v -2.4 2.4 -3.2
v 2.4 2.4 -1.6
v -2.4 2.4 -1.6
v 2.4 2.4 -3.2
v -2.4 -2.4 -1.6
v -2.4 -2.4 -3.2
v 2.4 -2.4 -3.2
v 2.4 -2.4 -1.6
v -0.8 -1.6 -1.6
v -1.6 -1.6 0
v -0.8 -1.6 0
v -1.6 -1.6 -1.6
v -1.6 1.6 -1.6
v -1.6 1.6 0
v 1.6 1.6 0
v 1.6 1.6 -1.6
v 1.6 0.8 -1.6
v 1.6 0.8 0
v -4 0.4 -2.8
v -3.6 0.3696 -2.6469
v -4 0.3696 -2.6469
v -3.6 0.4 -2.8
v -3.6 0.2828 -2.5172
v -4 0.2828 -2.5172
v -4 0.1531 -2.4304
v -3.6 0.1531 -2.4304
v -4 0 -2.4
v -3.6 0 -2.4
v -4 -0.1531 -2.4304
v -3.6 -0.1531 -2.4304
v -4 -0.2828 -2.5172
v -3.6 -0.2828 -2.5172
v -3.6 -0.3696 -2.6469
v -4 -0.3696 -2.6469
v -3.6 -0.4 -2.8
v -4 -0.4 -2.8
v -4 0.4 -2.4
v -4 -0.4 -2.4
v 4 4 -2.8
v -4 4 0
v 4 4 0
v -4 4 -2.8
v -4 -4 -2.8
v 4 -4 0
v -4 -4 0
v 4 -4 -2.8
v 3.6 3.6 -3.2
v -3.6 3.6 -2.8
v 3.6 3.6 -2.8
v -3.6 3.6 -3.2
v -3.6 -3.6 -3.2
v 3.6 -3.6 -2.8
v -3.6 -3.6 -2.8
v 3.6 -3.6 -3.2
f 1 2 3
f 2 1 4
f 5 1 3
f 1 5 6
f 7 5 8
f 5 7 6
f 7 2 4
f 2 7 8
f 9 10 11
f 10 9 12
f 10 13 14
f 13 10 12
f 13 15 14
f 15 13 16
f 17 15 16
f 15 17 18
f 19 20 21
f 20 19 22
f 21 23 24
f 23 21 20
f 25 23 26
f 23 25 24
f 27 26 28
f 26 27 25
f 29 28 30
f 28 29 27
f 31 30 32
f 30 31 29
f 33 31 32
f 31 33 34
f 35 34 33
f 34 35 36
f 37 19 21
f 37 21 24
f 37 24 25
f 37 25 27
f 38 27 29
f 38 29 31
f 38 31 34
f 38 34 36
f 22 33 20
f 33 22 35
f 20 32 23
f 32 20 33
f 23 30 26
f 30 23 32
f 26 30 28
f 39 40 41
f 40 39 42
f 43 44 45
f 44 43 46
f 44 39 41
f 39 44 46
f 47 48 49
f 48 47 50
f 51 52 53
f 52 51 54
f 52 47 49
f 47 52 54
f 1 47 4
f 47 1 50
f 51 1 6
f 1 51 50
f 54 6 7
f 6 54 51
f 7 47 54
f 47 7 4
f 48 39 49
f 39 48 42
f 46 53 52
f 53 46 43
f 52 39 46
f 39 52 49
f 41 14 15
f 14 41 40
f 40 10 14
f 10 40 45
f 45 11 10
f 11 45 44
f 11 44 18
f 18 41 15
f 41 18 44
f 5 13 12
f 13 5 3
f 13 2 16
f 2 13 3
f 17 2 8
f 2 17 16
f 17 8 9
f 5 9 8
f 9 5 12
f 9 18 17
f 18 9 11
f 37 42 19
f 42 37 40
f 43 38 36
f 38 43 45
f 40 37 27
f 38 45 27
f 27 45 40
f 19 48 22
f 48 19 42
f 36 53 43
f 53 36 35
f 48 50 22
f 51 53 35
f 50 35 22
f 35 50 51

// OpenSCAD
// file: ../../p/2-4edge.scad
use <../lib.scad>
function ldraw_lib__2_4edge() = [
// 0 Circle 0.5
// 0 Name: 2-4edge.dat
// 0 Author: James Jessiman
// 0 !LDRAW_ORG Primitive UPDATE 2017-01
// 0 !LICENSE Licensed under CC BY 2.0 and CC BY 4.0 : see CAreadme.txt
// 
// 0 BFC CERTIFY CCW
  [0,"BFC","CERTIFY"],
  [0,"BFC","CCW"],
// 
// 0 !HISTORY 2007-06-24 [PTadmin] Header formatted for Contributor Agreement
// 0 !HISTORY 2008-07-01 [PTadmin] Official Update 2008-01
// 0 !HISTORY 2017-01-15 [Steffen] BFCed
// 0 !HISTORY 2017-12-30 [PTadmin] Official Update 2017-01
// 
// 
// 2 24 1 0 0 0.9239 0 0.3827
  [2,24,1,0,0,0.9239,0,0.3827],
// 2 24 0.9239 0 0.3827 0.7071 0 0.7071
  [2,24,0.9239,0,0.3827,0.7071,0,0.7071],
// 2 24 0.7071 0 0.7071 0.3827 0 0.9239
  [2,24,0.7071,0,0.7071,0.3827,0,0.9239],
// 2 24 0.3827 0 0.9239 0 0 1
  [2,24,0.3827,0,0.9239,0,0,1],
// 2 24 0 0 1 -0.3827 0 0.9239
  [2,24,0,0,1,-0.3827,0,0.9239],
// 2 24 -0.3827 0 0.9239 -0.7071 0 0.7071
  [2,24,-0.3827,0,0.9239,-0.7071,0,0.7071],
// 2 24 -0.7071 0 0.7071 -0.9239 0 0.3827
  [2,24,-0.7071,0,0.7071,-0.9239,0,0.3827],
// 2 24 -0.9239 0 0.3827 -1 0 0
  [2,24,-0.9239,0,0.3827,-1,0,0],
];
makepoly(ldraw_lib__2_4edge(), line=0.2);
// file: ../../p/2-4cyli.scad
use <../lib.scad>
function ldraw_lib__2_4cyli() = [
// 0 Cylinder 0.5
// 0 Name: 2-4cyli.dat
// 0 Author: James Jessiman
// 0 !LDRAW_ORG Primitive UPDATE 2005-01
// 0 !LICENSE Licensed under CC BY 2.0 and CC BY 4.0 : see CAreadme.txt
// 
// 0 BFC CERTIFY CCW
  [0,"BFC","CERTIFY"],
  [0,"BFC","CCW"],
// 
// 0 !HISTORY 2002-03-23 [sbliss] Added BFC statement; compacted code
// 0 !HISTORY 2002-04-25 [PTadmin] Official Update 2002-02
// 0 !HISTORY 2004-12-11 [nielsk] Recreated using Primitive Generator, Edge lines fixed, BFC changed to CCW
// 0 !HISTORY 2005-12-28 [PTadmin] Official Update 2005-01
// 0 !HISTORY 2007-06-24 [PTadmin] Header formatted for Contributor Agreement
// 0 !HISTORY 2008-07-01 [PTadmin] Official Update 2008-01
// 
// 
// 4 16 .9239 1 .3827 .9239 0 .3827 1 0 0 1 1 0
  [4,16,.9239,1,.3827,.9239,0,.3827,1,0,0,1,1,0],
// 4 16 .7071 1 .7071 .7071 0 .7071 .9239 0 .3827 .9239 1 .3827
  [4,16,.7071,1,.7071,.7071,0,.7071,.9239,0,.3827,.9239,1,.3827],
// 4 16 .3827 1 .9239 .3827 0 .9239 .7071 0 .7071 .7071 1 .7071
  [4,16,.3827,1,.9239,.3827,0,.9239,.7071,0,.7071,.7071,1,.7071],
// 4 16 0 1 1 0 0 1 .3827 0 .9239 .3827 1 .9239
  [4,16,0,1,1,0,0,1,.3827,0,.9239,.3827,1,.9239],
// 4 16 -.3827 1 .9239 -.3827 0 .9239 0 0 1 0 1 1
  [4,16,-.3827,1,.9239,-.3827,0,.9239,0,0,1,0,1,1],
// 4 16 -.7071 1 .7071 -.7071 0 .7071 -.3827 0 .9239 -.3827 1 .9239
  [4,16,-.7071,1,.7071,-.7071,0,.7071,-.3827,0,.9239,-.3827,1,.9239],
// 4 16 -.9239 1 .3827 -.9239 0 .3827 -.7071 0 .7071 -.7071 1 .7071
  [4,16,-.9239,1,.3827,-.9239,0,.3827,-.7071,0,.7071,-.7071,1,.7071],
// 4 16 -1 1 0 -1 0 0 -.9239 0 .3827 -.9239 1 .3827
  [4,16,-1,1,0,-1,0,0,-.9239,0,.3827,-.9239,1,.3827],
// 5 24 1 1 0 1 0 0 1 1 -.4142 .9239 1 .3827
  [5,24,1,1,0,1,0,0,1,1,-.4142,.9239,1,.3827],
// 5 24 .9239 1 .3827 .9239 0 .3827 1 1 0 .7071 1 .7071
  [5,24,.9239,1,.3827,.9239,0,.3827,1,1,0,.7071,1,.7071],
// 5 24 .7071 1 .7071 .7071 0 .7071 .9239 1 .3827 .3827 1 .9239
  [5,24,.7071,1,.7071,.7071,0,.7071,.9239,1,.3827,.3827,1,.9239],
// 5 24 .3827 1 .9239 .3827 0 .9239 .7071 1 .7071 0 1 1
  [5,24,.3827,1,.9239,.3827,0,.9239,.7071,1,.7071,0,1,1],
// 5 24 0 1 1 0 0 1 .3827 1 .9239 -.3827 1 .9239
  [5,24,0,1,1,0,0,1,.3827,1,.9239,-.3827,1,.9239],
// 5 24 -.3827 1 .9239 -.3827 0 .9239 0 1 1 -.7071 1 .7071
  [5,24,-.3827,1,.9239,-.3827,0,.9239,0,1,1,-.7071,1,.7071],
// 5 24 -.7071 1 .7071 -.7071 0 .7071 -.3827 1 .9239 -.9239 1 .3827
  [5,24,-.7071,1,.7071,-.7071,0,.7071,-.3827,1,.9239,-.9239,1,.3827],
// 5 24 -.9239 1 .3827 -.9239 0 .3827 -.7071 1 .7071 -1 1 0
  [5,24,-.9239,1,.3827,-.9239,0,.3827,-.7071,1,.7071,-1,1,0],
// 5 24 -1 1 0 -1 0 0 -.9239 1 .3827 -1 1 -.4142
  [5,24,-1,1,0,-1,0,0,-.9239,1,.3827,-1,1,-.4142],
// 0
];
makepoly(ldraw_lib__2_4cyli(), line=0.2);
// file: ../../p/box4.scad
use <../lib.scad>
function ldraw_lib__box4() = [
// 0 Box with 4 Faces (2 Parallel Pairs) and All Edges
// 0 Name: box4.dat
// 0 Author: James Jessiman
// 0 !LDRAW_ORG Primitive UPDATE 2012-01
// 0 !LICENSE Licensed under CC BY 2.0 and CC BY 4.0 : see CAreadme.txt
// 
// 0 BFC CERTIFY CCW
  [0,"BFC","CERTIFY"],
  [0,"BFC","CCW"],
// 
// 0 !HISTORY 2002-04-03 [sbliss] Modified for BFC compliance
// 0 !HISTORY 2002-04-25 [PTadmin] Official Update 2002-02
// 0 !HISTORY 2007-06-24 [PTadmin] Header formatted for Contributor Agreement
// 0 !HISTORY 2008-07-01 [PTadmin] Official Update 2008-01
// 0 !HISTORY 2012-02-16 [Philo] Changed to CCW
// 0 !HISTORY 2012-03-30 [PTadmin] Official Update 2012-01
// 
// 
// 2 24 1 1 1 -1 1 1
  [2,24,1,1,1,-1,1,1],
// 2 24 -1 1 1 -1 1 -1
  [2,24,-1,1,1,-1,1,-1],
// 2 24 -1 1 -1 1 1 -1
  [2,24,-1,1,-1,1,1,-1],
// 2 24 1 1 -1 1 1 1
  [2,24,1,1,-1,1,1,1],
// 2 24 1 0 1 -1 0 1
  [2,24,1,0,1,-1,0,1],
// 2 24 -1 0 1 -1 0 -1
  [2,24,-1,0,1,-1,0,-1],
// 2 24 -1 0 -1 1 0 -1
  [2,24,-1,0,-1,1,0,-1],
// 2 24 1 0 -1 1 0 1
  [2,24,1,0,-1,1,0,1],
// 2 24 1 0 1 1 1 1
  [2,24,1,0,1,1,1,1],
// 2 24 -1 0 1 -1 1 1
  [2,24,-1,0,1,-1,1,1],
// 2 24 1 0 -1 1 1 -1
  [2,24,1,0,-1,1,1,-1],
// 2 24 -1 0 -1 -1 1 -1
  [2,24,-1,0,-1,-1,1,-1],
// 4 16 -1 1 1 -1 0 1 1 0 1 1 1 1
  [4,16,-1,1,1,-1,0,1,1,0,1,1,1,1],
// 4 16 -1 1 -1 -1 0 -1 -1 0 1 -1 1 1
  [4,16,-1,1,-1,-1,0,-1,-1,0,1,-1,1,1],
// 4 16 1 1 -1 1 0 -1 -1 0 -1 -1 1 -1
  [4,16,1,1,-1,1,0,-1,-1,0,-1,-1,1,-1],
// 4 16 1 1 1 1 0 1 1 0 -1 1 1 -1
  [4,16,1,1,1,1,0,1,1,0,-1,1,1,-1],
];
makepoly(ldraw_lib__box4(), line=0.2);
// file: ../../p/box2-9p.scad
use <../lib.scad>
function ldraw_lib__box2_9p() = [
// 0 Box with 2 Faces with 3 Parallel Edges
// 0 Name: box2-9p.dat
// 0 Author: Ronald Vallenduuk [Duq]
// 0 !LDRAW_ORG Primitive UPDATE 2013-02
// 0 !LICENSE Licensed under CC BY 2.0 and CC BY 4.0 : see CAreadme.txt
// 
// 0 BFC CERTIFY CCW
  [0,"BFC","CERTIFY"],
  [0,"BFC","CCW"],
// 
// 0 !HISTORY 2013-12-23 [PTadmin] Official Update 2013-02
// 
// 
// 2 24 1 1 1 -1 1 1
  [2,24,1,1,1,-1,1,1],
// 2 24 1 -1 1 -1 -1 1
  [2,24,1,-1,1,-1,-1,1],
// 2 24 1 1 -1 -1 1 -1
  [2,24,1,1,-1,-1,1,-1],
// 4 16 1 1 1 1 1 -1 -1 1 -1 -1 1 1
  [4,16,1,1,1,1,1,-1,-1,1,-1,-1,1,1],
// 4 16 1 1 1 -1 1 1 -1 -1 1 1 -1 1
  [4,16,1,1,1,-1,1,1,-1,-1,1,1,-1,1],
];
makepoly(ldraw_lib__box2_9p(), line=0.2);
// file: ../../p/2-4ndis.scad
use <../lib.scad>
function ldraw_lib__2_4ndis() = [
// 0 Disc Negative 0.5
// 0 Name: 2-4ndis.dat
// 0 Author: James Jessiman
// 0 !LDRAW_ORG Primitive UPDATE 2012-01
// 0 !LICENSE Licensed under CC BY 2.0 and CC BY 4.0 : see CAreadme.txt
// 
// 0 BFC CERTIFY CCW
  [0,"BFC","CERTIFY"],
  [0,"BFC","CCW"],
// 
// 0 !HISTORY 2002-03-23 [sbliss] Added BFC statement; compacted code
// 0 !HISTORY 2002-04-25 [PTadmin] Official Update 2002-02
// 0 !HISTORY 2007-06-24 [PTadmin] Header formatted for Contributor Agreement
// 0 !HISTORY 2008-07-01 [PTadmin] Official Update 2008-01
// 0 !HISTORY 2012-02-16 [Philo] Changed to CCW
// 0 !HISTORY 2012-03-30 [PTadmin] Official Update 2012-01
// 
// 
// 3 16 0.9239 0 0.3827 1 0 0 1 0 1
  [3,16,0.9239,0,0.3827,1,0,0,1,0,1],
// 3 16 0.7071 0 0.7071 0.9239 0 0.3827 1 0 1
  [3,16,0.7071,0,0.7071,0.9239,0,0.3827,1,0,1],
// 3 16 0.3827 0 0.9239 0.7071 0 0.7071 1 0 1
  [3,16,0.3827,0,0.9239,0.7071,0,0.7071,1,0,1],
// 3 16 0 0 1 0.3827 0 0.9239 1 0 1
  [3,16,0,0,1,0.3827,0,0.9239,1,0,1],
// 3 16 -0.3827 0 0.9239 0 0 1 -1 0 1
  [3,16,-0.3827,0,0.9239,0,0,1,-1,0,1],
// 3 16 -0.7071 0 0.7071 -0.3827 0 0.9239 -1 0 1
  [3,16,-0.7071,0,0.7071,-0.3827,0,0.9239,-1,0,1],
// 3 16 -0.9239 0 0.3827 -0.7071 0 0.7071 -1 0 1
  [3,16,-0.9239,0,0.3827,-0.7071,0,0.7071,-1,0,1],
// 3 16 -1 0 0 -0.9239 0 0.3827 -1 0 1
  [3,16,-1,0,0,-0.9239,0,0.3827,-1,0,1],
];
makepoly(ldraw_lib__2_4ndis(), line=0.2);
// file: ../../p/2-4cylo.scad
use <../lib.scad>
use <2-4cyli.scad>
use <2-4edge.scad>
function ldraw_lib__2_4cylo() = [
// 0 Cylinder Open 0.5
// 0 Name: 2-4cylo.dat
// 0 Author: Max Martin Richter [MMR1988]
// 0 !LDRAW_ORG Primitive UPDATE 2010-03
// 0 !LICENSE Licensed under CC BY 2.0 and CC BY 4.0 : see CAreadme.txt
// 
// 0 BFC CERTIFY CCW
  [0,"BFC","CERTIFY"],
  [0,"BFC","CCW"],
// 
// 0 !HISTORY 2010-12-31 [PTadmin] Official Update 2010-03
// 
// 
// 1 16 0 0 0 1 0 0 0 1 0 0 0 1 2-4edge.dat
  [1,16,0,0,0,1,0,0,0,1,0,0,0,1, ldraw_lib__2_4edge()],
// 1 16 0 1 0 1 0 0 0 1 0 0 0 1 2-4edge.dat
  [1,16,0,1,0,1,0,0,0,1,0,0,0,1, ldraw_lib__2_4edge()],
// 1 16 0 0 0 1 0 0 0 1 0 0 0 1 2-4cyli.dat
  [1,16,0,0,0,1,0,0,0,1,0,0,0,1, ldraw_lib__2_4cyli()],
];
makepoly(ldraw_lib__2_4cylo(), line=0.2);
// file: ../../p/2-4chrd.scad
use <../lib.scad>
function ldraw_lib__2_4chrd() = [
// 0 Chord 0.5
// 0 Name: 2-4chrd.dat
// 0 Author: Philippe Hurbain [Philo]
// 0 !LDRAW_ORG Primitive UPDATE 2014-01
// 0 !LICENSE Licensed under CC BY 2.0 and CC BY 4.0 : see CAreadme.txt
// 
// 0 BFC CERTIFY CCW
  [0,"BFC","CERTIFY"],
  [0,"BFC","CCW"],
// 
// 0 !HISTORY 2014-06-21 [PTadmin] Official Update 2014-01
// 
// 
// 4 16 0.9239 0 0.3827 -0.9239 0 0.3827 -1 0 0 1 0 0
  [4,16,0.9239,0,0.3827,-0.9239,0,0.3827,-1,0,0,1,0,0],
// 4 16 0.7071 0 0.7071 -0.7071 0 0.7071 -0.9239 0 0.3827 0.9239 0 0.3827
  [4,16,0.7071,0,0.7071,-0.7071,0,0.7071,-0.9239,0,0.3827,0.9239,0,0.3827],
// 4 16 0.3827 0 0.9239 -0.3827 0 0.9239 -0.7071 0 0.7071 0.7071 0 0.7071
  [4,16,0.3827,0,0.9239,-0.3827,0,0.9239,-0.7071,0,0.7071,0.7071,0,0.7071],
// 3 16 0 0 1 -0.3827 0 0.9239 0.3827 0 0.9239
  [3,16,0,0,1,-0.3827,0,0.9239,0.3827,0,0.9239],
];
makepoly(ldraw_lib__2_4chrd(), line=0.2);
// main file
use <../../lib.scad>
use <../../p/2-4chrd.scad>
use <../../p/2-4cylo.scad>
use <../../p/2-4ndis.scad>
use <../../p/box2-9p.scad>
use <../../p/box4.scad>
function ldraw_lib__s__72078s01() = [
// 0 ~Tile  1 x  1 x  0.5 with Raised Diamond - Base
// 0 Name: s\72078s01.dat
// 0 Author: Takeshi Takahashi [RainbowDolphin]
// 0 !LDRAW_ORG Subpart UPDATE 2022-05
// 0 !LICENSE Licensed under CC BY 2.0 and CC BY 4.0 : see CAreadme.txt
// 
// 0 BFC CERTIFY CCW
  [0,"BFC","CERTIFY"],
  [0,"BFC","CCW"],
// 
// 0 !HISTORY 2022-09-15 [PTadmin] Official Update 2022-05
// 
// 
// 0 BFC INVERTNEXT
  [0,"BFC","INVERTNEXT"],
// 1 16 0 8 0 6 0 0 0 -4 0 0 0 6 box4.dat
  [1,16,0,8,0,6,0,0,0,-4,0,0,0,6, ldraw_lib__box4()],
// 0 BFC INVERTNEXT
  [0,"BFC","INVERTNEXT"],
// 1 16 -3 2 0 0 0 -1 2 0 0 0 -4 0 box2-9p.dat
  [1,16,-3,2,0,0,0,-1,2,0,0,0,-4,0, ldraw_lib__box2_9p()],
// 0 BFC INVERTNEXT
  [0,"BFC","INVERTNEXT"],
// 1 16 0 2 3 0 0 4 2 0 0 0 1 0 box2-9p.dat
  [1,16,0,2,3,0,0,4,2,0,0,0,1,0, ldraw_lib__box2_9p()],
// 0 BFC INVERTNEXT
  [0,"BFC","INVERTNEXT"],
// 1 16 -10 7 0 0 1 0 0 0 -1 1 0 0 2-4cylo.dat
  [1,16,-10,7,0,0,1,0,0,0,-1,1,0,0, ldraw_lib__2_4cylo()],
// 1 16 -10 7 0 0 1 0 0 0 -1 1 0 0 2-4ndis.dat
  [1,16,-10,7,0,0,1,0,0,0,-1,1,0,0, ldraw_lib__2_4ndis()],
// 1 16 -9 7 0 0 1 0 0 0 -1 1 0 0 2-4chrd.dat
  [1,16,-9,7,0,0,1,0,0,0,-1,1,0,0, ldraw_lib__2_4chrd()],
// 
// 4 16 -10 7 10 -10 0 10 10 0 10 10 7 10
  [4,16,-10,7,10,-10,0,10,10,0,10,10,7,10],
// 4 16 10 7 -10 10 0 -10 -10 0 -10 -10 7 -10
  [4,16,10,7,-10,10,0,-10,-10,0,-10,-10,7,-10],
// 4 16 10 7 10 10 0 10 10 0 -10 10 7 -10
  [4,16,10,7,10,10,0,10,10,0,-10,10,7,-10],
// 4 16 9 7 9 9 8 9 -9 8 9 -9 7 9
  [4,16,9,7,9,9,8,9,-9,8,9,-9,7,9],
// 4 16 -9 7 -9 -9 8 -9 9 8 -9 9 7 -9
  [4,16,-9,7,-9,-9,8,-9,9,8,-9,9,7,-9],
// 4 16 9 7 -9 9 8 -9 9 8 9 9 7 9
  [4,16,9,7,-9,9,8,-9,9,8,9,9,7,9],
// 4 16 9 8 9 6 8 6 -6 8 6 -9 8 9
  [4,16,9,8,9,6,8,6,-6,8,6,-9,8,9],
// 4 16 -9 8 9 -6 8 6 -6 8 -6 -9 8 -9
  [4,16,-9,8,9,-6,8,6,-6,8,-6,-9,8,-9],
// 4 16 -9 8 -9 -6 8 -6 6 8 -6 9 8 -9
  [4,16,-9,8,-9,-6,8,-6,6,8,-6,9,8,-9],
// 4 16 9 8 -9 6 8 -6 6 8 6 9 8 9
  [4,16,9,8,-9,6,8,-6,6,8,6,9,8,9],
// 4 16 10 7 10 9 7 9 -9 7 9 -10 7 10
  [4,16,10,7,10,9,7,9,-9,7,9,-10,7,10],
// 4 16 -10 7 -10 -9 7 -9 9 7 -9 10 7 -10
  [4,16,-10,7,-10,-9,7,-9,9,7,-9,10,7,-10],
// 4 16 10 7 -10 9 7 -9 9 7 9 10 7 10
  [4,16,10,7,-10,9,7,-9,9,7,9,10,7,10],
// 4 16 -10 0 10 -4 0 4 4 0 4 10 0 10
  [4,16,-10,0,10,-4,0,4,4,0,4,10,0,10],
// 4 16 -10 0 10 -10 0 -10 -4 0 -4 -4 0 4
  [4,16,-10,0,10,-10,0,-10,-4,0,-4,-4,0,4],
// 4 16 -4 0 -4 -10 0 -10 10 0 -10 -2 0 -4
  [4,16,-4,0,-4,-10,0,-10,10,0,-10,-2,0,-4],
// 3 16 -2 0 -4 10 0 -10 4 0 2
  [3,16,-2,0,-4,10,0,-10,4,0,2],
// 4 16 4 0 4 4 0 2 10 0 -10 10 0 10
  [4,16,4,0,4,4,0,2,10,0,-10,10,0,10],
// 4 16 -6 4 -6 -6 4 6 -4 4 4 -4 4 -4
  [4,16,-6,4,-6,-6,4,6,-4,4,4,-4,4,-4],
// 4 16 -6 4 6 6 4 6 4 4 4 -4 4 4
  [4,16,-6,4,6,6,4,6,4,4,4,-4,4,4],
// 4 16 4 4 4 6 4 6 6 4 -6 4 4 2
  [4,16,4,4,4,6,4,6,6,4,-6,4,4,2],
// 3 16 4 4 2 6 4 -6 -2 4 -4
  [3,16,4,4,2,6,4,-6,-2,4,-4],
// 4 16 6 4 -6 -6 4 -6 -4 4 -4 -2 4 -4
  [4,16,6,4,-6,-6,4,-6,-4,4,-4,-2,4,-4],
// 4 16 -2 4 -4 -2 0 -4 4 0 2 4 4 2
  [4,16,-2,4,-4,-2,0,-4,4,0,2,4,4,2],
// 4 16 -10 7 1 -10 6 1 -10 0 10 -10 7 10
  [4,16,-10,7,1,-10,6,1,-10,0,10,-10,7,10],
// 4 16 -10 0 -10 -10 6 -1 -10 7 -1 -10 7 -10
  [4,16,-10,0,-10,-10,6,-1,-10,7,-1,-10,7,-10],
// 3 16 -10 0 10 -10 6 1 -10 6 0
  [3,16,-10,0,10,-10,6,1,-10,6,0],
// 3 16 -10 6 -1 -10 0 -10 -10 6 0
  [3,16,-10,6,-1,-10,0,-10,-10,6,0],
// 3 16 -10 6 0 -10 0 -10 -10 0 10
  [3,16,-10,6,0,-10,0,-10,-10,0,10],
// 4 16 -10 7 10 -9 7 9 -9 7 1 -10 7 1
  [4,16,-10,7,10,-9,7,9,-9,7,1,-10,7,1],
// 4 16 -10 7 -1 -9 7 -1 -9 7 -9 -10 7 -10
  [4,16,-10,7,-1,-9,7,-1,-9,7,-9,-10,7,-10],
// 3 16 -9 7 9 -9 8 9 -9 7 1
  [3,16,-9,7,9,-9,8,9,-9,7,1],
// 3 16 -9 8 -9 -9 7 -9 -9 7 -1
  [3,16,-9,8,-9,-9,7,-9,-9,7,-1],
// 4 16 -9 7 -1 -9 7 1 -9 8 9 -9 8 -9
  [4,16,-9,7,-1,-9,7,1,-9,8,9,-9,8,-9],
// 2 24 10 7 10 -10 7 10
  [2,24,10,7,10,-10,7,10],
// 2 24 -10 7 -10 10 7 -10
  [2,24,-10,7,-10,10,7,-10],
// 2 24 10 7 -10 10 7 10
  [2,24,10,7,-10,10,7,10],
// 2 24 10 0 10 -10 0 10
  [2,24,10,0,10,-10,0,10],
// 2 24 -10 0 10 -10 0 -10
  [2,24,-10,0,10,-10,0,-10],
// 2 24 -10 0 -10 10 0 -10
  [2,24,-10,0,-10,10,0,-10],
// 2 24 10 0 -10 10 0 10
  [2,24,10,0,-10,10,0,10],
// 2 24 10 0 10 10 7 10
  [2,24,10,0,10,10,7,10],
// 2 24 -10 0 10 -10 7 10
  [2,24,-10,0,10,-10,7,10],
// 2 24 10 0 -10 10 7 -10
  [2,24,10,0,-10,10,7,-10],
// 2 24 -10 0 -10 -10 7 -10
  [2,24,-10,0,-10,-10,7,-10],
// 2 24 9 8 9 -9 8 9
  [2,24,9,8,9,-9,8,9],
// 2 24 -9 8 9 -9 8 -9
  [2,24,-9,8,9,-9,8,-9],
// 2 24 -9 8 -9 9 8 -9
  [2,24,-9,8,-9,9,8,-9],
// 2 24 9 8 -9 9 8 9
  [2,24,9,8,-9,9,8,9],
// 2 24 9 7 9 -9 7 9
  [2,24,9,7,9,-9,7,9],
// 2 24 -9 7 -9 9 7 -9
  [2,24,-9,7,-9,9,7,-9],
// 2 24 9 7 -9 9 7 9
  [2,24,9,7,-9,9,7,9],
// 2 24 9 7 9 9 8 9
  [2,24,9,7,9,9,8,9],
// 2 24 -9 7 9 -9 8 9
  [2,24,-9,7,9,-9,8,9],
// 2 24 9 7 -9 9 8 -9
  [2,24,9,7,-9,9,8,-9],
// 2 24 -9 7 -9 -9 8 -9
  [2,24,-9,7,-9,-9,8,-9],
// 2 24 -2 0 -4 4 0 2
  [2,24,-2,0,-4,4,0,2],
// 2 24 -2 0 -4 -4 0 -4
  [2,24,-2,0,-4,-4,0,-4],
// 2 24 -4 0 -4 -4 0 4
  [2,24,-4,0,-4,-4,0,4],
// 2 24 -4 0 4 4 0 4
  [2,24,-4,0,4,4,0,4],
// 2 24 4 0 4 4 0 2
  [2,24,4,0,4,4,0,2],
// 2 24 -10 7 10 -10 7 1
  [2,24,-10,7,10,-10,7,1],
// 2 24 -10 7 -1 -10 7 -10
  [2,24,-10,7,-1,-10,7,-10],
// 2 24 -10 7 -1 -9 7 -1
  [2,24,-10,7,-1,-9,7,-1],
// 2 24 -10 7 1 -9 7 1
  [2,24,-10,7,1,-9,7,1],
// 2 24 -9 7 9 -9 7 1
  [2,24,-9,7,9,-9,7,1],
// 2 24 -9 7 -1 -9 7 -9
  [2,24,-9,7,-1,-9,7,-9],
];
makepoly(ldraw_lib__s__72078s01(), line=0.2);
